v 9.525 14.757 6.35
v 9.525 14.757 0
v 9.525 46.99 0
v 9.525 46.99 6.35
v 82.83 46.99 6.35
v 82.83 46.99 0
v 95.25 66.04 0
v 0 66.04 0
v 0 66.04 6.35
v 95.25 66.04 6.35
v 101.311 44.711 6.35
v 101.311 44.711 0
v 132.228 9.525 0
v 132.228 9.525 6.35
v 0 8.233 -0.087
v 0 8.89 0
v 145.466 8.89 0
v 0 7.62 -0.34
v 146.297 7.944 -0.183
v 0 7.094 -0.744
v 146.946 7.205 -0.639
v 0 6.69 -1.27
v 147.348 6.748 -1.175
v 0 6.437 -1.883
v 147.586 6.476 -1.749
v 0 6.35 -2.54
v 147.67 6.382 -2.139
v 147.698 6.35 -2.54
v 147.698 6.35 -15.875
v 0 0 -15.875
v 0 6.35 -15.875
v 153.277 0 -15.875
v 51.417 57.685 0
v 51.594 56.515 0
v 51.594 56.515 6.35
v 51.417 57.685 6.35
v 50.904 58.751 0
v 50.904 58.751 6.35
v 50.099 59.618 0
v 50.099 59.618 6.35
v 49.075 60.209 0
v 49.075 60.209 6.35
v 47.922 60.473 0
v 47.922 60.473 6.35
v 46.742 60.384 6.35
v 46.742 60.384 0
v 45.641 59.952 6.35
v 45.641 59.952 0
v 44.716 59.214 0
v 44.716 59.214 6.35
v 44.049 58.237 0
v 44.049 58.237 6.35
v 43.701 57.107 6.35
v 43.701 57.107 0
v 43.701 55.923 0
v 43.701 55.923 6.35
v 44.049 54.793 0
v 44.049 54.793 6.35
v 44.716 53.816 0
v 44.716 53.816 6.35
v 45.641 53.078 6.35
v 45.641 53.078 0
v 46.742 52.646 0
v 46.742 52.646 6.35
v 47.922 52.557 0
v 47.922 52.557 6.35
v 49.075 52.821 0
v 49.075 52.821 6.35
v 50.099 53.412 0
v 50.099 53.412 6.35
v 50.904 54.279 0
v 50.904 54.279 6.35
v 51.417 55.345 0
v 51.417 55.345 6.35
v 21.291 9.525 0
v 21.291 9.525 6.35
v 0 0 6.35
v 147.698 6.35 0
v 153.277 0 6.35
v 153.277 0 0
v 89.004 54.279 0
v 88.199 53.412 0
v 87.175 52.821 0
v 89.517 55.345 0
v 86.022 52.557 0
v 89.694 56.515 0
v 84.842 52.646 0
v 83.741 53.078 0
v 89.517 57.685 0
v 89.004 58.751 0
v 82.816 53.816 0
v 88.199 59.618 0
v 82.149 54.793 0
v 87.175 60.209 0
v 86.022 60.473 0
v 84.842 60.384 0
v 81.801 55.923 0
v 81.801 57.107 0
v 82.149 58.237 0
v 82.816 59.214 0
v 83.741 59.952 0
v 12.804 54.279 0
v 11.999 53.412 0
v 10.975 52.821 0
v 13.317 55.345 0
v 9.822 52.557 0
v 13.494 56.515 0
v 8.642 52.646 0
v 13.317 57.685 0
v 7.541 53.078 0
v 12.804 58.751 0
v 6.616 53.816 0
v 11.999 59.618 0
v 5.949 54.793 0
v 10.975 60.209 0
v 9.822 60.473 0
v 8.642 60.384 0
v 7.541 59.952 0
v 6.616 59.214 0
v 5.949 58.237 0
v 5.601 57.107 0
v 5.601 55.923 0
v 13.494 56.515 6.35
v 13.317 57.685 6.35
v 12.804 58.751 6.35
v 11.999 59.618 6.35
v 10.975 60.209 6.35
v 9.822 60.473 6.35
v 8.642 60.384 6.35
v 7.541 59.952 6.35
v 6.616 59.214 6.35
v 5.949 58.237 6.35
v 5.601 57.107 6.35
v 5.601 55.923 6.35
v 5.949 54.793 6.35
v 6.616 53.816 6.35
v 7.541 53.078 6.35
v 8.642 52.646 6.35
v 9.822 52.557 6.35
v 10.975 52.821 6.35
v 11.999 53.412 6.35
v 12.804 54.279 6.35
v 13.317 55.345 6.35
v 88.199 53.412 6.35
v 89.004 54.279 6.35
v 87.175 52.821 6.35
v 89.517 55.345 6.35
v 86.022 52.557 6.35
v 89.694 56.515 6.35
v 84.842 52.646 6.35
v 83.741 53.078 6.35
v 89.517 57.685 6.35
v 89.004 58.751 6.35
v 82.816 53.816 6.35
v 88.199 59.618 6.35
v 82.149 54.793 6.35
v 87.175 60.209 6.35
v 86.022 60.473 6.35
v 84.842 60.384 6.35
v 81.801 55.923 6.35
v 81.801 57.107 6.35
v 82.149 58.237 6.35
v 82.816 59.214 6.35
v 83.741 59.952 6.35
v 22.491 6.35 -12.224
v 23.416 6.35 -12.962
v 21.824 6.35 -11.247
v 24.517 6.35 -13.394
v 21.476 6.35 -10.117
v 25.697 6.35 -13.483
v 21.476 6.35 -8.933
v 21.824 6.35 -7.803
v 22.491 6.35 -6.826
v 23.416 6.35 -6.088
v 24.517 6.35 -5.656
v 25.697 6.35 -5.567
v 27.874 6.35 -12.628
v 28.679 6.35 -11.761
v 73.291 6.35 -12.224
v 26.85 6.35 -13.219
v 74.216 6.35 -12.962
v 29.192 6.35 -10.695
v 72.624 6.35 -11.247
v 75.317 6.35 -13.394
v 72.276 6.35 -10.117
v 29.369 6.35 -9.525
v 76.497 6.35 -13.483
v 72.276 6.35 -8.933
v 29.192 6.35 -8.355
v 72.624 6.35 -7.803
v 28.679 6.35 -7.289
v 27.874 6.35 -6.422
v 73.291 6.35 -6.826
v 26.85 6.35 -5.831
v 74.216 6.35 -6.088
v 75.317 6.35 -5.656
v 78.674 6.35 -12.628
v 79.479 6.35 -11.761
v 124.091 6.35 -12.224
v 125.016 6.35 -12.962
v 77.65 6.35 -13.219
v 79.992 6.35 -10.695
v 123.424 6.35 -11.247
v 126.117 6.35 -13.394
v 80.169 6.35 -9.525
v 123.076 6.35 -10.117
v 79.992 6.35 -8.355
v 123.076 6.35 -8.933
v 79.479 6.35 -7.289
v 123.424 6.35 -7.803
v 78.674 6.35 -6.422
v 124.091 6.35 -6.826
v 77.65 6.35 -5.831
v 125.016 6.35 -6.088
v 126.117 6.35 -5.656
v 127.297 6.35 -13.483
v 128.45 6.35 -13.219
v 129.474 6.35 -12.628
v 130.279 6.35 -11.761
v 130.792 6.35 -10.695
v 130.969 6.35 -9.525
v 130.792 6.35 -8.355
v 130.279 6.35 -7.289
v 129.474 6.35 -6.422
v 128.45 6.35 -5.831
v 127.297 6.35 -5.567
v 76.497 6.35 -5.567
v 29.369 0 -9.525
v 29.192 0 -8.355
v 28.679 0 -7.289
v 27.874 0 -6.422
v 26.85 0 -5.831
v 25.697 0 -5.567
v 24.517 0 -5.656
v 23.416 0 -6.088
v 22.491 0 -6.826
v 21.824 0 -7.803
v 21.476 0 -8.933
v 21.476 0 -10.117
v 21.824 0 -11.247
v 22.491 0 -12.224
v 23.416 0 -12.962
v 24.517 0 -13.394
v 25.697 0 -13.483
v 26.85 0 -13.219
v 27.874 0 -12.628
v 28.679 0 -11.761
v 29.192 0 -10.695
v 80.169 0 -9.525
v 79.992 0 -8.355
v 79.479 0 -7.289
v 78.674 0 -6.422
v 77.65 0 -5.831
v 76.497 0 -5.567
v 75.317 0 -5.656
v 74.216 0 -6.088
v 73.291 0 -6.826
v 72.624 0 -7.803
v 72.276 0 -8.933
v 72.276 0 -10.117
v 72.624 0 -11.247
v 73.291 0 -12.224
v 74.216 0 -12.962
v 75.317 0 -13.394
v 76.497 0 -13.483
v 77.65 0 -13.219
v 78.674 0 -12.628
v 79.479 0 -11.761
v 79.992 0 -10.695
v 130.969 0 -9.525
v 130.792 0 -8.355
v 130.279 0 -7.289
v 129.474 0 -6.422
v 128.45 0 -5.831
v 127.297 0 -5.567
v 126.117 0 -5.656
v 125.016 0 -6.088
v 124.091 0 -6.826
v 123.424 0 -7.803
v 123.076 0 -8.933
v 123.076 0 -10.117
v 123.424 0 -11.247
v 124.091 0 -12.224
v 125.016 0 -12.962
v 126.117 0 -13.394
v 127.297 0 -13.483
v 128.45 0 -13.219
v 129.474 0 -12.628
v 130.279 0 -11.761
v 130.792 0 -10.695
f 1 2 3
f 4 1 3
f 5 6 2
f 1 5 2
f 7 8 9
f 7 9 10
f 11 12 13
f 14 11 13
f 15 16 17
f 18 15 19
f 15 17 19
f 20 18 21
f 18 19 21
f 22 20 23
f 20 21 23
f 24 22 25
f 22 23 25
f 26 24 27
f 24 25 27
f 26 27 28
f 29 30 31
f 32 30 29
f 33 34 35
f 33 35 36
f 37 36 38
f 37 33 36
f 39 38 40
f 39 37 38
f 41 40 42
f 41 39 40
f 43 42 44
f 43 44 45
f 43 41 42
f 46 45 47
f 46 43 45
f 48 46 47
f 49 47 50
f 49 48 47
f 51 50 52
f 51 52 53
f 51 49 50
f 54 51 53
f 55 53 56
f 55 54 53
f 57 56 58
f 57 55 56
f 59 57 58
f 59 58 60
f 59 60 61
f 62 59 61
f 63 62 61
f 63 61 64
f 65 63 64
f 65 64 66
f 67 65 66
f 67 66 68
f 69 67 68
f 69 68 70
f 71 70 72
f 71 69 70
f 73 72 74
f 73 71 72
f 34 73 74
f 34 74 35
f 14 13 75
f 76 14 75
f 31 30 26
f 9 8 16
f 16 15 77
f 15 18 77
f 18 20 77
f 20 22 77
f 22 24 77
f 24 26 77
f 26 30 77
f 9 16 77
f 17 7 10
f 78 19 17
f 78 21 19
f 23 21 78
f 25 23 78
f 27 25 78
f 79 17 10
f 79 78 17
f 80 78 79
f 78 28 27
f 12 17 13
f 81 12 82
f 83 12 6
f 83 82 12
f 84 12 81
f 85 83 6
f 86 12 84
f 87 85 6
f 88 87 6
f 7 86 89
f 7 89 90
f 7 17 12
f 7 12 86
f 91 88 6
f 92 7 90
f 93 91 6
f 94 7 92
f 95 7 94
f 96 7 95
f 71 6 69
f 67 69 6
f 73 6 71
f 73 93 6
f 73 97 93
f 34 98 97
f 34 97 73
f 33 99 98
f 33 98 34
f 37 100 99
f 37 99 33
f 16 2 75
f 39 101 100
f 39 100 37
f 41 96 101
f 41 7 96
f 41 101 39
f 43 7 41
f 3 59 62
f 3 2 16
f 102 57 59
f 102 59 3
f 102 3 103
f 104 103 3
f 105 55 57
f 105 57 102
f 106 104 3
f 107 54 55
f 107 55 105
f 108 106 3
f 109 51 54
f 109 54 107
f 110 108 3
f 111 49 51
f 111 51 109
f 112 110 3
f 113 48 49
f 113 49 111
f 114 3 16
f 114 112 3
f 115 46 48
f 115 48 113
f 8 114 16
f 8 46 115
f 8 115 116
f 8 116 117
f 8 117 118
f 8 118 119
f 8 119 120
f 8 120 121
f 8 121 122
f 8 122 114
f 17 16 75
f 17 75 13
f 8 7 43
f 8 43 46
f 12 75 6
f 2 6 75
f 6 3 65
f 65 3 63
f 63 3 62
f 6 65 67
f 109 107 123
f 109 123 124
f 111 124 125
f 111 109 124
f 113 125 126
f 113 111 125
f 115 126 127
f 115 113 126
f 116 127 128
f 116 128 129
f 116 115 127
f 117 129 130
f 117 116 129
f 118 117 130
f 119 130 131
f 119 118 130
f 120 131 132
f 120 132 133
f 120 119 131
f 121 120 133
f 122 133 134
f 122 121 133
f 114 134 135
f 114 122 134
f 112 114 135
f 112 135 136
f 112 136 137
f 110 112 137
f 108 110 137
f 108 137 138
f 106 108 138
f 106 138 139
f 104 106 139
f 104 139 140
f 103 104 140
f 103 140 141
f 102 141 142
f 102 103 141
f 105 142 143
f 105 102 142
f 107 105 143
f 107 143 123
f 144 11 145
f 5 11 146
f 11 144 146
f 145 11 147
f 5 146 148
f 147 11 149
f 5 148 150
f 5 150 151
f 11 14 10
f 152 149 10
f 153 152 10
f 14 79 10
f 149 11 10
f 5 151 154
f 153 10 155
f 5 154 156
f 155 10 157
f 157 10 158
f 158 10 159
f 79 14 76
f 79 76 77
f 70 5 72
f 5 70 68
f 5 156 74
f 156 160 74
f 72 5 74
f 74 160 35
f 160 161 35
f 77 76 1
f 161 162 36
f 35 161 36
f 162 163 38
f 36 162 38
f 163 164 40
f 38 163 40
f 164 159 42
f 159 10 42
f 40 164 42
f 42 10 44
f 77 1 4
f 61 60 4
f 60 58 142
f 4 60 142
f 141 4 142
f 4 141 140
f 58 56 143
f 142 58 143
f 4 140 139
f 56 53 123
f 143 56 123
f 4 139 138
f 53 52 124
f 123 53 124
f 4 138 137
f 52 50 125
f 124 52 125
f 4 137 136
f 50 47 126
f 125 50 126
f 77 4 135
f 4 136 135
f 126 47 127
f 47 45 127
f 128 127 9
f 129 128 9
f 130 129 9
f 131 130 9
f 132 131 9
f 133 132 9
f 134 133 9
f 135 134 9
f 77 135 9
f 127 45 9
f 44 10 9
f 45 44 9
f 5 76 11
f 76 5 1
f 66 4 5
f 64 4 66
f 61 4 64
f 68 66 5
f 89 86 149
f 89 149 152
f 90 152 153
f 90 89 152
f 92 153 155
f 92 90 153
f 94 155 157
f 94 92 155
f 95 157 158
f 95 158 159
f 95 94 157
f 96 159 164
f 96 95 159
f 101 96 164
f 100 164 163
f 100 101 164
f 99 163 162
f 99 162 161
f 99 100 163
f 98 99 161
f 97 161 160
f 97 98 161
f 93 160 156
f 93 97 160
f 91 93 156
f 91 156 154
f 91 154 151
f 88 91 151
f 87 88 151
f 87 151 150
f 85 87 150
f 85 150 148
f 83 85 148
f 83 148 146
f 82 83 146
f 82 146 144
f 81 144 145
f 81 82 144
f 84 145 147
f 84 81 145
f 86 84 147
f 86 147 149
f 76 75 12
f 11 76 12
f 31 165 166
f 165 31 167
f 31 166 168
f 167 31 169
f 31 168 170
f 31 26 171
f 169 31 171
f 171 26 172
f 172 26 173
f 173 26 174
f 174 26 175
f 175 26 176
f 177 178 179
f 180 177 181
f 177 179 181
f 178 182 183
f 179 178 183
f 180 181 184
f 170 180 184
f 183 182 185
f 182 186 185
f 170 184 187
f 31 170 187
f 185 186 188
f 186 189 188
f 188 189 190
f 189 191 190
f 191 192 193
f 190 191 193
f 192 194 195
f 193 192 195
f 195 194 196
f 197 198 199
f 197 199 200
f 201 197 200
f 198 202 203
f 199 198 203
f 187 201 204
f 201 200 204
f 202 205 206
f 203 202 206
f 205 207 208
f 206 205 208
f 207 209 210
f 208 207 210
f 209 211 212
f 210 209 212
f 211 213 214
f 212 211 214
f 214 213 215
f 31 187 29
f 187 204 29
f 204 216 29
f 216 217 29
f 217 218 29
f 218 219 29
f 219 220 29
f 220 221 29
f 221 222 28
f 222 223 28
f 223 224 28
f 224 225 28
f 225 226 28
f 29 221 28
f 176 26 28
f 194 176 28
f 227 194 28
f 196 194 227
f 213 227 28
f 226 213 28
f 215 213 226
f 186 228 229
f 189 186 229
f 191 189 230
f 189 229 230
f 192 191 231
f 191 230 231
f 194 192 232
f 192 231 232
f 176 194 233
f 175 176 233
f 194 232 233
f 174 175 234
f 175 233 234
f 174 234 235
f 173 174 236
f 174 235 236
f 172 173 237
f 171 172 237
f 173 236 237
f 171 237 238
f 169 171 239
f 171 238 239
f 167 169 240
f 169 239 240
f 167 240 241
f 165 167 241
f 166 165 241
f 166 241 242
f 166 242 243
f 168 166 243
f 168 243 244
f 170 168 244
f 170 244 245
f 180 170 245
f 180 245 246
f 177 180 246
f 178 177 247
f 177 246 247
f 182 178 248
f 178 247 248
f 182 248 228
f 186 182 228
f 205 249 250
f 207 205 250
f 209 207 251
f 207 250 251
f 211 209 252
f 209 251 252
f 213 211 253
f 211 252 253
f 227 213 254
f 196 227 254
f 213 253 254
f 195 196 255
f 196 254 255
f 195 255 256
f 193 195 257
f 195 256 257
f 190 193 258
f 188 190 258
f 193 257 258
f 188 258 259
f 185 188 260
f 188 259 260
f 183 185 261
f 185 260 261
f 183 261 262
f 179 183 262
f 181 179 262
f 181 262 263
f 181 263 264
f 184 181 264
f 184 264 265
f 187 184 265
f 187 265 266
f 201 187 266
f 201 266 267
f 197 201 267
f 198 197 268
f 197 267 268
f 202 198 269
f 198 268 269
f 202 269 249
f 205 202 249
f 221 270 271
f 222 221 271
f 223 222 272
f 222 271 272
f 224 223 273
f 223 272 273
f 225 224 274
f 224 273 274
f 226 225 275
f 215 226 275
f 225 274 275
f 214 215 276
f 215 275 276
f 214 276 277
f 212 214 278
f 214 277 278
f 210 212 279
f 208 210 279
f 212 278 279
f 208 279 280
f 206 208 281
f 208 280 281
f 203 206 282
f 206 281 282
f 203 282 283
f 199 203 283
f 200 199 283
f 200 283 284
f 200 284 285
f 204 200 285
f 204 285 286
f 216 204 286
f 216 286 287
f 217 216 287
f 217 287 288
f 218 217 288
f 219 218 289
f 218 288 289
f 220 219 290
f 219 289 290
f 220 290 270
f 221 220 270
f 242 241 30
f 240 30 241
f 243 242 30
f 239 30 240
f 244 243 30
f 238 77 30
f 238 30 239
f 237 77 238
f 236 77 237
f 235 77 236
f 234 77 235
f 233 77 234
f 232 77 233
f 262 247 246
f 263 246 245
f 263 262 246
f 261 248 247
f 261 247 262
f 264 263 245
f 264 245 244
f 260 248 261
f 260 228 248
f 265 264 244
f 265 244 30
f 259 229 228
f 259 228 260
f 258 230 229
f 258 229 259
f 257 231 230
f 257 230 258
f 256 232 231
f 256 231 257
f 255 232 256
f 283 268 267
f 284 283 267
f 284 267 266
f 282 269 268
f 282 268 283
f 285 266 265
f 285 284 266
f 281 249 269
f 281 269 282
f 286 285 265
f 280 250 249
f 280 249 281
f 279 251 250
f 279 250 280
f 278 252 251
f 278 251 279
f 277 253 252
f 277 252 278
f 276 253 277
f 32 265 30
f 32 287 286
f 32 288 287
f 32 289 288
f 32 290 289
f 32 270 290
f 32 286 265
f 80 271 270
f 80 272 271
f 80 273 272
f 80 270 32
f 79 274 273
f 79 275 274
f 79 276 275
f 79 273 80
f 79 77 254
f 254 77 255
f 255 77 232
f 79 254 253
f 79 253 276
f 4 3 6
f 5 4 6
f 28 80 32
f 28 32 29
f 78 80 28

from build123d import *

# Parameters (mm, degrees)
SKETCH1_R           = 3.96875
BOSS_EXTRUDE1_DEPTH = 6.35
SKETCH2_W           = 153.277121284
SKETCH2_H           = 15.875
SKETCH2_R           = 3.96875
BOSS_EXTRUDE2_DEPTH = 6.35
FILLET1_R           = 2.54
CUT_EXTRUDE1_DEPTH  = 16.875


with BuildPart() as part:
    # Sketch1 → Boss-Extrude1 (new body)
    with BuildSketch(Plane.XY):
        Polygon((0, 0), (0, 66.04), (95.25, 66.04), (153.277121284, 0), align=None)
        with Locations((9.525, 56.515)):
            Circle(SKETCH1_R, mode=Mode.SUBTRACT)
        with Locations((47.625, 56.515)):
            Circle(SKETCH1_R, mode=Mode.SUBTRACT)
        with Locations((85.725, 56.515)):
            Circle(SKETCH1_R, mode=Mode.SUBTRACT)
        Polygon((9.525, 14.756535386), (9.525, 46.99), (82.829969346, 46.99), align=None, mode=Mode.SUBTRACT)
        Polygon((21.290817509, 9.525), (101.311219354, 44.71135659), (132.228284487, 9.525), align=None, mode=Mode.SUBTRACT)
    extrude(amount=BOSS_EXTRUDE1_DEPTH)

    # Sketch2 → Boss-Extrude2 (add)
    with BuildSketch(Plane.XZ):
        with Locations((76.638560642, -7.9375)):
            Rectangle(SKETCH2_W, SKETCH2_H)
        with Locations((25.4, -9.525)):
            Circle(SKETCH2_R, mode=Mode.SUBTRACT)
        with Locations((76.2, -9.525)):
            Circle(SKETCH2_R, mode=Mode.SUBTRACT)
        with Locations((127, -9.525)):
            Circle(SKETCH2_R, mode=Mode.SUBTRACT)
    extrude(amount=-BOSS_EXTRUDE2_DEPTH)

    # Fillet1
    fillet1_edges = [part.edges().sort_by_distance(p)[0] for p in [
        (73.848795196, 6.35, 0),
    ]]
    fillet(fillet1_edges, radius=FILLET1_R)

    # Sketch3 → Cut-Extrude1 (cut, through all)
    with BuildSketch(Plane(origin=(0, 0, 0), x_dir=(-1, 0, 0), z_dir=(0, 0, -1))):
        Polygon((-153.277121284, 0), (-143.888240191, 10.685377693), (-163.562021825, 13.552350256), (-165.283233358, 4.245452075), align=None)
    extrude(amount=CUT_EXTRUDE1_DEPTH, mode=Mode.SUBTRACT)


solid = part.part
